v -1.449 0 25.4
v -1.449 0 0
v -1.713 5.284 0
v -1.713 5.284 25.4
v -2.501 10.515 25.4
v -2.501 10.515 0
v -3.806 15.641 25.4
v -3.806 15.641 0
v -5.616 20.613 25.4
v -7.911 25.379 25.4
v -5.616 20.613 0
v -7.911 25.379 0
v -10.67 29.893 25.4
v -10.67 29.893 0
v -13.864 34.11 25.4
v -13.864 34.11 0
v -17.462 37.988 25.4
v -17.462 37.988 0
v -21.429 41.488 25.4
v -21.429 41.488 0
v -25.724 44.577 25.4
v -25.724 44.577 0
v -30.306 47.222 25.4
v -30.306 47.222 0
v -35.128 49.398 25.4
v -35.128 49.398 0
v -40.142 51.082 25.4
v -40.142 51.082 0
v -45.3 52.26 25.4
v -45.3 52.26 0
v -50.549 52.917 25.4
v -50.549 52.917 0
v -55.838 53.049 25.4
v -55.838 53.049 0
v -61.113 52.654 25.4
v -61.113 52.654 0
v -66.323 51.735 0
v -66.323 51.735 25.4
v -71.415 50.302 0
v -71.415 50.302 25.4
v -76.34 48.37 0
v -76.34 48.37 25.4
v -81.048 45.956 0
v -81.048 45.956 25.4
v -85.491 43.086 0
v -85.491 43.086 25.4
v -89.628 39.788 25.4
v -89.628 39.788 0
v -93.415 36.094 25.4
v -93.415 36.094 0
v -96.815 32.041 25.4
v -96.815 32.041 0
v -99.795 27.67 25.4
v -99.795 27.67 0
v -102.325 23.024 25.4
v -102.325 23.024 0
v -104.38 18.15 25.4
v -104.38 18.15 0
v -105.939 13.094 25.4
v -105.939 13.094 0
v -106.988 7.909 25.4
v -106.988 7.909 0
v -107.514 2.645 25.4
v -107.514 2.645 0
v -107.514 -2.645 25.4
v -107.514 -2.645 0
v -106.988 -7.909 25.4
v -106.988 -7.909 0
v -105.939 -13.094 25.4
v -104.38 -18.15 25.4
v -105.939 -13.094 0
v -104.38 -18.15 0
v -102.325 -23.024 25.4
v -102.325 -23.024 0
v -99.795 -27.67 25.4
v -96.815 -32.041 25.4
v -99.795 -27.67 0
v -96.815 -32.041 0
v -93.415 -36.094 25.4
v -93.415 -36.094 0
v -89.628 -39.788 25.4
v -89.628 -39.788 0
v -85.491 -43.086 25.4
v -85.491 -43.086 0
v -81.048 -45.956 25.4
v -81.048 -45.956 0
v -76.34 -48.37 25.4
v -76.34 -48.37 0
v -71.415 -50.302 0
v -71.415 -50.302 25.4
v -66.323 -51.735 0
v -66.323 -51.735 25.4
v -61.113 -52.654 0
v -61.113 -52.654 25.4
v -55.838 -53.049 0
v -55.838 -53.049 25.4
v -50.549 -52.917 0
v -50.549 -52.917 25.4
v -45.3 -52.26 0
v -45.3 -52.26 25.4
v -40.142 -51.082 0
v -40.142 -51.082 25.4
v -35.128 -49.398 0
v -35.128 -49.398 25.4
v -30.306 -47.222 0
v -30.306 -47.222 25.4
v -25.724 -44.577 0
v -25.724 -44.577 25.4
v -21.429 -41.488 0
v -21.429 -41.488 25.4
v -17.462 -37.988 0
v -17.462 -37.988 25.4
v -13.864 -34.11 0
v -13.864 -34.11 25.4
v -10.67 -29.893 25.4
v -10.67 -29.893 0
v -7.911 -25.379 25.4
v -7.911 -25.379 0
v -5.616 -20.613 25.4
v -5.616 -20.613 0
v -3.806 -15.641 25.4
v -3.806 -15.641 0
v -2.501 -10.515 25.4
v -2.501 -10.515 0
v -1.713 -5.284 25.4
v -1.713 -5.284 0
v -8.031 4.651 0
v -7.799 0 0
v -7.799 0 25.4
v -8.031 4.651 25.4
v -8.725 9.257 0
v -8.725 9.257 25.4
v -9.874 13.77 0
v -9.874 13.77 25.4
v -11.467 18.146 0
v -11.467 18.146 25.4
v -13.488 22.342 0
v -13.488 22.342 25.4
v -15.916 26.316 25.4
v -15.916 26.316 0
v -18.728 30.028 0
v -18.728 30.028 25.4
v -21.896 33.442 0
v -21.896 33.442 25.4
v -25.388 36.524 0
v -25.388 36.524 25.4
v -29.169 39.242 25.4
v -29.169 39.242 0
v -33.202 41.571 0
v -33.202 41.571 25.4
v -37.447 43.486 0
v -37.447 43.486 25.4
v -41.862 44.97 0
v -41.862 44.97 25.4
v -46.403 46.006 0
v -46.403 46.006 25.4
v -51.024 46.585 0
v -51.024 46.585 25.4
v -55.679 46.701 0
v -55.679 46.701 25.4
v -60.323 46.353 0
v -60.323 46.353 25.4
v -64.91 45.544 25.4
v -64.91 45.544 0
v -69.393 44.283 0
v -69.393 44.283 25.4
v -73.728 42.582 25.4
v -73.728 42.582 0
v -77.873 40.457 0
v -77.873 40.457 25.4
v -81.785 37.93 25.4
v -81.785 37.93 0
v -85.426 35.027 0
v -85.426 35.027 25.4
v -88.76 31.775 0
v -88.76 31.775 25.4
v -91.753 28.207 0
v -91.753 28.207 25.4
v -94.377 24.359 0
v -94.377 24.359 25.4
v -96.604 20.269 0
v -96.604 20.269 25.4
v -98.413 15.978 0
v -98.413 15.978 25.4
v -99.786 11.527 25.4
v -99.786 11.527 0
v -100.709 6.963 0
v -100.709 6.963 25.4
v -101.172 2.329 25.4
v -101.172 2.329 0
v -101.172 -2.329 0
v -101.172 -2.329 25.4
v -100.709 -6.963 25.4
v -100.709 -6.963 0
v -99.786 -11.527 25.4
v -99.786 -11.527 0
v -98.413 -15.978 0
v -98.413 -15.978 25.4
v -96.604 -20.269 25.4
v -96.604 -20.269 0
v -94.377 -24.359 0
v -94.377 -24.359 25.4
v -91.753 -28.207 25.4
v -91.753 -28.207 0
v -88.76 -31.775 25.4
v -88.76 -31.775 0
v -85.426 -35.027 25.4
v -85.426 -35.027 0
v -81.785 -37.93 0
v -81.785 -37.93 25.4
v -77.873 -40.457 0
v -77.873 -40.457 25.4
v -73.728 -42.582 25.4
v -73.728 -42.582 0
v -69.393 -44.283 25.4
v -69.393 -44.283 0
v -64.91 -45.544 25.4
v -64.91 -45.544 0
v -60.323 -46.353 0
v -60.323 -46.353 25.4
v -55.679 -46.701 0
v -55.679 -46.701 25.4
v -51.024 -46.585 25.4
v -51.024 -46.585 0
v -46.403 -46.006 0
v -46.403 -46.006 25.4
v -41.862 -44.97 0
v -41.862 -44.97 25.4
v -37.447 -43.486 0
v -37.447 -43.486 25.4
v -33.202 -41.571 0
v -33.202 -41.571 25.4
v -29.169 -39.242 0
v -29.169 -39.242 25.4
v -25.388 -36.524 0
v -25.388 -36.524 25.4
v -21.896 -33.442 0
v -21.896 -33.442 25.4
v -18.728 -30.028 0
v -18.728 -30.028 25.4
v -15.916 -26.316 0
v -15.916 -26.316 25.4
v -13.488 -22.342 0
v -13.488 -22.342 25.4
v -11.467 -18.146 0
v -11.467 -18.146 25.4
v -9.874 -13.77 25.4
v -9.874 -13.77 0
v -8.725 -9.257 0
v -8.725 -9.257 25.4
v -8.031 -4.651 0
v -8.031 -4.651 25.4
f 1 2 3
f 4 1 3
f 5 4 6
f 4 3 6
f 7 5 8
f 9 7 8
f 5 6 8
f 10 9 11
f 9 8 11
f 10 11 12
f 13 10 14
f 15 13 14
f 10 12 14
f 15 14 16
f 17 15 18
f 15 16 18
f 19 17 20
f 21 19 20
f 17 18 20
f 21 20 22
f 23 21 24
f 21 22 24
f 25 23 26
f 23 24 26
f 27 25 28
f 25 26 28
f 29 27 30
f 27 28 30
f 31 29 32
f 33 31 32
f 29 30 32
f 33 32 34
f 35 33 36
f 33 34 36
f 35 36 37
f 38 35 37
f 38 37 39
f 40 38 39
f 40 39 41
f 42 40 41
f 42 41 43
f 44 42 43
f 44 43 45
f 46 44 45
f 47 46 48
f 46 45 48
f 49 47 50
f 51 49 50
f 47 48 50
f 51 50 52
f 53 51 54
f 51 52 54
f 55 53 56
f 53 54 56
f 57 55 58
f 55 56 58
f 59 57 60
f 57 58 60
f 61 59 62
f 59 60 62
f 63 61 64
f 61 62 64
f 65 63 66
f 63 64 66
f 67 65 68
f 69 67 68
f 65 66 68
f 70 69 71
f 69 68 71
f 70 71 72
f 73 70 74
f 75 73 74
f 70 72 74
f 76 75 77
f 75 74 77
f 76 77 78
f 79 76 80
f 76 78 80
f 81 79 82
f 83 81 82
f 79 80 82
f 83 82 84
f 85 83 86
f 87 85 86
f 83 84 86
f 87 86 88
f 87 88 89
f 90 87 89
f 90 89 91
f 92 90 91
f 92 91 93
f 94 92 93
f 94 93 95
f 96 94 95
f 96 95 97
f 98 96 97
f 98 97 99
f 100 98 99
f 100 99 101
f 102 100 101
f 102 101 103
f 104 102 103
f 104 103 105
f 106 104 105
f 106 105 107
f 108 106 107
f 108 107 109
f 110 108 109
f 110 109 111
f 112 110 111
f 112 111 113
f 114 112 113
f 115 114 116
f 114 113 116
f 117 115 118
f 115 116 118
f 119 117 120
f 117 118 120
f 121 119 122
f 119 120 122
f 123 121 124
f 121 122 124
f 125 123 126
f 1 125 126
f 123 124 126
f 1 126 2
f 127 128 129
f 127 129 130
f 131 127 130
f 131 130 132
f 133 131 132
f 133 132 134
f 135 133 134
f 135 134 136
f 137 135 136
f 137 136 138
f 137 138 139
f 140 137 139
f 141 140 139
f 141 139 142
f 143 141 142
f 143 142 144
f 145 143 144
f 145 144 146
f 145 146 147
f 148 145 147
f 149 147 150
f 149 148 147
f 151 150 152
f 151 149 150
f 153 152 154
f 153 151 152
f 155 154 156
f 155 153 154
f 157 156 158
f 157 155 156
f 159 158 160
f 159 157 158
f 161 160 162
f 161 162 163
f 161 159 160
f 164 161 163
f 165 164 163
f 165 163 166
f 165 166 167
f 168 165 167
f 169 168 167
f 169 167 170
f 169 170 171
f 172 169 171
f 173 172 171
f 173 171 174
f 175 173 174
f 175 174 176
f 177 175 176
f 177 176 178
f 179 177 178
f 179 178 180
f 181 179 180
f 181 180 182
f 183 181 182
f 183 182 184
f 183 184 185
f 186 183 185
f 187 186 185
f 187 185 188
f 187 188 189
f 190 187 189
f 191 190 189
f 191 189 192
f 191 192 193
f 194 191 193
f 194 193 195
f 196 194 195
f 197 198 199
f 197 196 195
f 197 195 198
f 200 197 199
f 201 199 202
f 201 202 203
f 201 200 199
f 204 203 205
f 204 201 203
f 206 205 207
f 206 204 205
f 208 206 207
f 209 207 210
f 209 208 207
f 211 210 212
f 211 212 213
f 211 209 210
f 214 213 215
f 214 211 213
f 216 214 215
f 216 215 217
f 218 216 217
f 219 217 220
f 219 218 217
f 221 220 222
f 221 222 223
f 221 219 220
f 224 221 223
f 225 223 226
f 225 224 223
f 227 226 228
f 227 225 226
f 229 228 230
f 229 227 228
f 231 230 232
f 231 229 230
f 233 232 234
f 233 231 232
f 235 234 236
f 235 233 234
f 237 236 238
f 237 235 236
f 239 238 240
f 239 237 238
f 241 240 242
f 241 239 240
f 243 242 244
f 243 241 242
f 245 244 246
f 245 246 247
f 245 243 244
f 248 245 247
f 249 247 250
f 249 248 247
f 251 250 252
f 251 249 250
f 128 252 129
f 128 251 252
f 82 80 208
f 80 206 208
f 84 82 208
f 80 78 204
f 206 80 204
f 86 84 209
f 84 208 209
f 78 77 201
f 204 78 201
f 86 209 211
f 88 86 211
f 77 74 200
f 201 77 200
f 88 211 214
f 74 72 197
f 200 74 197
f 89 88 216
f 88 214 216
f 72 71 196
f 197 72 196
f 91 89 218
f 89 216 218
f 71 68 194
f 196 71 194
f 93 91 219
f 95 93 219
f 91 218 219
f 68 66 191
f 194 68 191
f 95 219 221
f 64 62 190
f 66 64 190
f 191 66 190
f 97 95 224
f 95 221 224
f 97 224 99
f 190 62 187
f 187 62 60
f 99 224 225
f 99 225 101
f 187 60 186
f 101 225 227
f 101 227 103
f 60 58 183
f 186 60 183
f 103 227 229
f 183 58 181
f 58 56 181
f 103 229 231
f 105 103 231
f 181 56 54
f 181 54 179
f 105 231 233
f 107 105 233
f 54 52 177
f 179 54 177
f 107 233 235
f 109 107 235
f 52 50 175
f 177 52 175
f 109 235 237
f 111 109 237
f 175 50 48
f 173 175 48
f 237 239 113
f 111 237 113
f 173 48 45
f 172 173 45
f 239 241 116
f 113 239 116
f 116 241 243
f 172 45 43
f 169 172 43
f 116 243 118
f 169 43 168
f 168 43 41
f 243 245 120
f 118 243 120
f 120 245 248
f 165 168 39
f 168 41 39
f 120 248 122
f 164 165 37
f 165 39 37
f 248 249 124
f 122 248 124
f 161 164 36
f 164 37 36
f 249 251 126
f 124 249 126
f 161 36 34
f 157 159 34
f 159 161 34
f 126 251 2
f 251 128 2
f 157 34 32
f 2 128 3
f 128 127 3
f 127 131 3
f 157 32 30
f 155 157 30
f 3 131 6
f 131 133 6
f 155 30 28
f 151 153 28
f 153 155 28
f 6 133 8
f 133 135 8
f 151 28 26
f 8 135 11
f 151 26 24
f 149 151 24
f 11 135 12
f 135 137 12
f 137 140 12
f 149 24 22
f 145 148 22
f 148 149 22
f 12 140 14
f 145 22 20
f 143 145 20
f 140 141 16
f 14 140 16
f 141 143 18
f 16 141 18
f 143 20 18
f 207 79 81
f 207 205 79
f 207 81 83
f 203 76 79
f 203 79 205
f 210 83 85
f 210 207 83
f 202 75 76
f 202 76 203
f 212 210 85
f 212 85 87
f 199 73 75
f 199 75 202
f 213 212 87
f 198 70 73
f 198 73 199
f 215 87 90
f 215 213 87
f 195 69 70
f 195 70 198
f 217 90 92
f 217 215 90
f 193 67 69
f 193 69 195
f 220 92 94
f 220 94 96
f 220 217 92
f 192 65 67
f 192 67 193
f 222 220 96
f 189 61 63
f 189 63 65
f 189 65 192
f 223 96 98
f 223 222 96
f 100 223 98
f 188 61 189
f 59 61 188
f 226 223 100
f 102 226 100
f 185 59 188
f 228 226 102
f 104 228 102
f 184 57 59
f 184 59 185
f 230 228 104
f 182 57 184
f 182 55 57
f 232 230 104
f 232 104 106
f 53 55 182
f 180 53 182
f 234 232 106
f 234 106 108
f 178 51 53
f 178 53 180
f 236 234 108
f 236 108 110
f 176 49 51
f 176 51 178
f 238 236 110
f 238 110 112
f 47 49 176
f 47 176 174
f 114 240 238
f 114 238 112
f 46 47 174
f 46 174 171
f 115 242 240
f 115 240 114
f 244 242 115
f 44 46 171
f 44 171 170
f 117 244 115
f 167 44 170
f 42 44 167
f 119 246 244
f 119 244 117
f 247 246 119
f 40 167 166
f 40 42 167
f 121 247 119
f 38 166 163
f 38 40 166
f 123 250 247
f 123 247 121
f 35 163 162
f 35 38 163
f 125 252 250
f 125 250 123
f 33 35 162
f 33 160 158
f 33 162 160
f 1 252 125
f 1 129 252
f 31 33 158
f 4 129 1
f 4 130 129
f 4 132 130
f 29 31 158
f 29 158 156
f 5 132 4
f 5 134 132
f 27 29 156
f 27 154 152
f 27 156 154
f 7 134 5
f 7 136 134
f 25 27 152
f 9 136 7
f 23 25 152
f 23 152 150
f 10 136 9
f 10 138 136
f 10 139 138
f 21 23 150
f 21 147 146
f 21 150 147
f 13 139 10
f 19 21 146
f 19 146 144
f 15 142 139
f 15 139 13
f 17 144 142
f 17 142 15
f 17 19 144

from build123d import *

# Parameters (mm, degrees)
F0_R     = 53.853392601
F2_DEPTH = 25.4
F1_R     = 53.065742398
F4_T     = -6.35


with BuildPart() as f2:
    # F0 (on Top) → F2 (new body)
    with BuildSketch(Plane.XY):
        with Locations((-53.853392601, 0)):
            Circle(F0_R)
    extrude(amount=F2_DEPTH)


with BuildPart() as f2b:
    # F1 (on Top) → F2, piece 2 (new body)
    with BuildSketch(Plane.XY):
        with Locations((-54.5146726072, 0)):
            Circle(F1_R)
    extrude(amount=F2_DEPTH)

    # F4
    f4_openings = [f2b.faces().sort_by_distance(p)[0] for p in [
        (-54.514673, 0, 0),
        (-54.514673, 0, 25.4),
    ]]
    offset(amount=F4_T, openings=f4_openings)


solid = f2b.part
